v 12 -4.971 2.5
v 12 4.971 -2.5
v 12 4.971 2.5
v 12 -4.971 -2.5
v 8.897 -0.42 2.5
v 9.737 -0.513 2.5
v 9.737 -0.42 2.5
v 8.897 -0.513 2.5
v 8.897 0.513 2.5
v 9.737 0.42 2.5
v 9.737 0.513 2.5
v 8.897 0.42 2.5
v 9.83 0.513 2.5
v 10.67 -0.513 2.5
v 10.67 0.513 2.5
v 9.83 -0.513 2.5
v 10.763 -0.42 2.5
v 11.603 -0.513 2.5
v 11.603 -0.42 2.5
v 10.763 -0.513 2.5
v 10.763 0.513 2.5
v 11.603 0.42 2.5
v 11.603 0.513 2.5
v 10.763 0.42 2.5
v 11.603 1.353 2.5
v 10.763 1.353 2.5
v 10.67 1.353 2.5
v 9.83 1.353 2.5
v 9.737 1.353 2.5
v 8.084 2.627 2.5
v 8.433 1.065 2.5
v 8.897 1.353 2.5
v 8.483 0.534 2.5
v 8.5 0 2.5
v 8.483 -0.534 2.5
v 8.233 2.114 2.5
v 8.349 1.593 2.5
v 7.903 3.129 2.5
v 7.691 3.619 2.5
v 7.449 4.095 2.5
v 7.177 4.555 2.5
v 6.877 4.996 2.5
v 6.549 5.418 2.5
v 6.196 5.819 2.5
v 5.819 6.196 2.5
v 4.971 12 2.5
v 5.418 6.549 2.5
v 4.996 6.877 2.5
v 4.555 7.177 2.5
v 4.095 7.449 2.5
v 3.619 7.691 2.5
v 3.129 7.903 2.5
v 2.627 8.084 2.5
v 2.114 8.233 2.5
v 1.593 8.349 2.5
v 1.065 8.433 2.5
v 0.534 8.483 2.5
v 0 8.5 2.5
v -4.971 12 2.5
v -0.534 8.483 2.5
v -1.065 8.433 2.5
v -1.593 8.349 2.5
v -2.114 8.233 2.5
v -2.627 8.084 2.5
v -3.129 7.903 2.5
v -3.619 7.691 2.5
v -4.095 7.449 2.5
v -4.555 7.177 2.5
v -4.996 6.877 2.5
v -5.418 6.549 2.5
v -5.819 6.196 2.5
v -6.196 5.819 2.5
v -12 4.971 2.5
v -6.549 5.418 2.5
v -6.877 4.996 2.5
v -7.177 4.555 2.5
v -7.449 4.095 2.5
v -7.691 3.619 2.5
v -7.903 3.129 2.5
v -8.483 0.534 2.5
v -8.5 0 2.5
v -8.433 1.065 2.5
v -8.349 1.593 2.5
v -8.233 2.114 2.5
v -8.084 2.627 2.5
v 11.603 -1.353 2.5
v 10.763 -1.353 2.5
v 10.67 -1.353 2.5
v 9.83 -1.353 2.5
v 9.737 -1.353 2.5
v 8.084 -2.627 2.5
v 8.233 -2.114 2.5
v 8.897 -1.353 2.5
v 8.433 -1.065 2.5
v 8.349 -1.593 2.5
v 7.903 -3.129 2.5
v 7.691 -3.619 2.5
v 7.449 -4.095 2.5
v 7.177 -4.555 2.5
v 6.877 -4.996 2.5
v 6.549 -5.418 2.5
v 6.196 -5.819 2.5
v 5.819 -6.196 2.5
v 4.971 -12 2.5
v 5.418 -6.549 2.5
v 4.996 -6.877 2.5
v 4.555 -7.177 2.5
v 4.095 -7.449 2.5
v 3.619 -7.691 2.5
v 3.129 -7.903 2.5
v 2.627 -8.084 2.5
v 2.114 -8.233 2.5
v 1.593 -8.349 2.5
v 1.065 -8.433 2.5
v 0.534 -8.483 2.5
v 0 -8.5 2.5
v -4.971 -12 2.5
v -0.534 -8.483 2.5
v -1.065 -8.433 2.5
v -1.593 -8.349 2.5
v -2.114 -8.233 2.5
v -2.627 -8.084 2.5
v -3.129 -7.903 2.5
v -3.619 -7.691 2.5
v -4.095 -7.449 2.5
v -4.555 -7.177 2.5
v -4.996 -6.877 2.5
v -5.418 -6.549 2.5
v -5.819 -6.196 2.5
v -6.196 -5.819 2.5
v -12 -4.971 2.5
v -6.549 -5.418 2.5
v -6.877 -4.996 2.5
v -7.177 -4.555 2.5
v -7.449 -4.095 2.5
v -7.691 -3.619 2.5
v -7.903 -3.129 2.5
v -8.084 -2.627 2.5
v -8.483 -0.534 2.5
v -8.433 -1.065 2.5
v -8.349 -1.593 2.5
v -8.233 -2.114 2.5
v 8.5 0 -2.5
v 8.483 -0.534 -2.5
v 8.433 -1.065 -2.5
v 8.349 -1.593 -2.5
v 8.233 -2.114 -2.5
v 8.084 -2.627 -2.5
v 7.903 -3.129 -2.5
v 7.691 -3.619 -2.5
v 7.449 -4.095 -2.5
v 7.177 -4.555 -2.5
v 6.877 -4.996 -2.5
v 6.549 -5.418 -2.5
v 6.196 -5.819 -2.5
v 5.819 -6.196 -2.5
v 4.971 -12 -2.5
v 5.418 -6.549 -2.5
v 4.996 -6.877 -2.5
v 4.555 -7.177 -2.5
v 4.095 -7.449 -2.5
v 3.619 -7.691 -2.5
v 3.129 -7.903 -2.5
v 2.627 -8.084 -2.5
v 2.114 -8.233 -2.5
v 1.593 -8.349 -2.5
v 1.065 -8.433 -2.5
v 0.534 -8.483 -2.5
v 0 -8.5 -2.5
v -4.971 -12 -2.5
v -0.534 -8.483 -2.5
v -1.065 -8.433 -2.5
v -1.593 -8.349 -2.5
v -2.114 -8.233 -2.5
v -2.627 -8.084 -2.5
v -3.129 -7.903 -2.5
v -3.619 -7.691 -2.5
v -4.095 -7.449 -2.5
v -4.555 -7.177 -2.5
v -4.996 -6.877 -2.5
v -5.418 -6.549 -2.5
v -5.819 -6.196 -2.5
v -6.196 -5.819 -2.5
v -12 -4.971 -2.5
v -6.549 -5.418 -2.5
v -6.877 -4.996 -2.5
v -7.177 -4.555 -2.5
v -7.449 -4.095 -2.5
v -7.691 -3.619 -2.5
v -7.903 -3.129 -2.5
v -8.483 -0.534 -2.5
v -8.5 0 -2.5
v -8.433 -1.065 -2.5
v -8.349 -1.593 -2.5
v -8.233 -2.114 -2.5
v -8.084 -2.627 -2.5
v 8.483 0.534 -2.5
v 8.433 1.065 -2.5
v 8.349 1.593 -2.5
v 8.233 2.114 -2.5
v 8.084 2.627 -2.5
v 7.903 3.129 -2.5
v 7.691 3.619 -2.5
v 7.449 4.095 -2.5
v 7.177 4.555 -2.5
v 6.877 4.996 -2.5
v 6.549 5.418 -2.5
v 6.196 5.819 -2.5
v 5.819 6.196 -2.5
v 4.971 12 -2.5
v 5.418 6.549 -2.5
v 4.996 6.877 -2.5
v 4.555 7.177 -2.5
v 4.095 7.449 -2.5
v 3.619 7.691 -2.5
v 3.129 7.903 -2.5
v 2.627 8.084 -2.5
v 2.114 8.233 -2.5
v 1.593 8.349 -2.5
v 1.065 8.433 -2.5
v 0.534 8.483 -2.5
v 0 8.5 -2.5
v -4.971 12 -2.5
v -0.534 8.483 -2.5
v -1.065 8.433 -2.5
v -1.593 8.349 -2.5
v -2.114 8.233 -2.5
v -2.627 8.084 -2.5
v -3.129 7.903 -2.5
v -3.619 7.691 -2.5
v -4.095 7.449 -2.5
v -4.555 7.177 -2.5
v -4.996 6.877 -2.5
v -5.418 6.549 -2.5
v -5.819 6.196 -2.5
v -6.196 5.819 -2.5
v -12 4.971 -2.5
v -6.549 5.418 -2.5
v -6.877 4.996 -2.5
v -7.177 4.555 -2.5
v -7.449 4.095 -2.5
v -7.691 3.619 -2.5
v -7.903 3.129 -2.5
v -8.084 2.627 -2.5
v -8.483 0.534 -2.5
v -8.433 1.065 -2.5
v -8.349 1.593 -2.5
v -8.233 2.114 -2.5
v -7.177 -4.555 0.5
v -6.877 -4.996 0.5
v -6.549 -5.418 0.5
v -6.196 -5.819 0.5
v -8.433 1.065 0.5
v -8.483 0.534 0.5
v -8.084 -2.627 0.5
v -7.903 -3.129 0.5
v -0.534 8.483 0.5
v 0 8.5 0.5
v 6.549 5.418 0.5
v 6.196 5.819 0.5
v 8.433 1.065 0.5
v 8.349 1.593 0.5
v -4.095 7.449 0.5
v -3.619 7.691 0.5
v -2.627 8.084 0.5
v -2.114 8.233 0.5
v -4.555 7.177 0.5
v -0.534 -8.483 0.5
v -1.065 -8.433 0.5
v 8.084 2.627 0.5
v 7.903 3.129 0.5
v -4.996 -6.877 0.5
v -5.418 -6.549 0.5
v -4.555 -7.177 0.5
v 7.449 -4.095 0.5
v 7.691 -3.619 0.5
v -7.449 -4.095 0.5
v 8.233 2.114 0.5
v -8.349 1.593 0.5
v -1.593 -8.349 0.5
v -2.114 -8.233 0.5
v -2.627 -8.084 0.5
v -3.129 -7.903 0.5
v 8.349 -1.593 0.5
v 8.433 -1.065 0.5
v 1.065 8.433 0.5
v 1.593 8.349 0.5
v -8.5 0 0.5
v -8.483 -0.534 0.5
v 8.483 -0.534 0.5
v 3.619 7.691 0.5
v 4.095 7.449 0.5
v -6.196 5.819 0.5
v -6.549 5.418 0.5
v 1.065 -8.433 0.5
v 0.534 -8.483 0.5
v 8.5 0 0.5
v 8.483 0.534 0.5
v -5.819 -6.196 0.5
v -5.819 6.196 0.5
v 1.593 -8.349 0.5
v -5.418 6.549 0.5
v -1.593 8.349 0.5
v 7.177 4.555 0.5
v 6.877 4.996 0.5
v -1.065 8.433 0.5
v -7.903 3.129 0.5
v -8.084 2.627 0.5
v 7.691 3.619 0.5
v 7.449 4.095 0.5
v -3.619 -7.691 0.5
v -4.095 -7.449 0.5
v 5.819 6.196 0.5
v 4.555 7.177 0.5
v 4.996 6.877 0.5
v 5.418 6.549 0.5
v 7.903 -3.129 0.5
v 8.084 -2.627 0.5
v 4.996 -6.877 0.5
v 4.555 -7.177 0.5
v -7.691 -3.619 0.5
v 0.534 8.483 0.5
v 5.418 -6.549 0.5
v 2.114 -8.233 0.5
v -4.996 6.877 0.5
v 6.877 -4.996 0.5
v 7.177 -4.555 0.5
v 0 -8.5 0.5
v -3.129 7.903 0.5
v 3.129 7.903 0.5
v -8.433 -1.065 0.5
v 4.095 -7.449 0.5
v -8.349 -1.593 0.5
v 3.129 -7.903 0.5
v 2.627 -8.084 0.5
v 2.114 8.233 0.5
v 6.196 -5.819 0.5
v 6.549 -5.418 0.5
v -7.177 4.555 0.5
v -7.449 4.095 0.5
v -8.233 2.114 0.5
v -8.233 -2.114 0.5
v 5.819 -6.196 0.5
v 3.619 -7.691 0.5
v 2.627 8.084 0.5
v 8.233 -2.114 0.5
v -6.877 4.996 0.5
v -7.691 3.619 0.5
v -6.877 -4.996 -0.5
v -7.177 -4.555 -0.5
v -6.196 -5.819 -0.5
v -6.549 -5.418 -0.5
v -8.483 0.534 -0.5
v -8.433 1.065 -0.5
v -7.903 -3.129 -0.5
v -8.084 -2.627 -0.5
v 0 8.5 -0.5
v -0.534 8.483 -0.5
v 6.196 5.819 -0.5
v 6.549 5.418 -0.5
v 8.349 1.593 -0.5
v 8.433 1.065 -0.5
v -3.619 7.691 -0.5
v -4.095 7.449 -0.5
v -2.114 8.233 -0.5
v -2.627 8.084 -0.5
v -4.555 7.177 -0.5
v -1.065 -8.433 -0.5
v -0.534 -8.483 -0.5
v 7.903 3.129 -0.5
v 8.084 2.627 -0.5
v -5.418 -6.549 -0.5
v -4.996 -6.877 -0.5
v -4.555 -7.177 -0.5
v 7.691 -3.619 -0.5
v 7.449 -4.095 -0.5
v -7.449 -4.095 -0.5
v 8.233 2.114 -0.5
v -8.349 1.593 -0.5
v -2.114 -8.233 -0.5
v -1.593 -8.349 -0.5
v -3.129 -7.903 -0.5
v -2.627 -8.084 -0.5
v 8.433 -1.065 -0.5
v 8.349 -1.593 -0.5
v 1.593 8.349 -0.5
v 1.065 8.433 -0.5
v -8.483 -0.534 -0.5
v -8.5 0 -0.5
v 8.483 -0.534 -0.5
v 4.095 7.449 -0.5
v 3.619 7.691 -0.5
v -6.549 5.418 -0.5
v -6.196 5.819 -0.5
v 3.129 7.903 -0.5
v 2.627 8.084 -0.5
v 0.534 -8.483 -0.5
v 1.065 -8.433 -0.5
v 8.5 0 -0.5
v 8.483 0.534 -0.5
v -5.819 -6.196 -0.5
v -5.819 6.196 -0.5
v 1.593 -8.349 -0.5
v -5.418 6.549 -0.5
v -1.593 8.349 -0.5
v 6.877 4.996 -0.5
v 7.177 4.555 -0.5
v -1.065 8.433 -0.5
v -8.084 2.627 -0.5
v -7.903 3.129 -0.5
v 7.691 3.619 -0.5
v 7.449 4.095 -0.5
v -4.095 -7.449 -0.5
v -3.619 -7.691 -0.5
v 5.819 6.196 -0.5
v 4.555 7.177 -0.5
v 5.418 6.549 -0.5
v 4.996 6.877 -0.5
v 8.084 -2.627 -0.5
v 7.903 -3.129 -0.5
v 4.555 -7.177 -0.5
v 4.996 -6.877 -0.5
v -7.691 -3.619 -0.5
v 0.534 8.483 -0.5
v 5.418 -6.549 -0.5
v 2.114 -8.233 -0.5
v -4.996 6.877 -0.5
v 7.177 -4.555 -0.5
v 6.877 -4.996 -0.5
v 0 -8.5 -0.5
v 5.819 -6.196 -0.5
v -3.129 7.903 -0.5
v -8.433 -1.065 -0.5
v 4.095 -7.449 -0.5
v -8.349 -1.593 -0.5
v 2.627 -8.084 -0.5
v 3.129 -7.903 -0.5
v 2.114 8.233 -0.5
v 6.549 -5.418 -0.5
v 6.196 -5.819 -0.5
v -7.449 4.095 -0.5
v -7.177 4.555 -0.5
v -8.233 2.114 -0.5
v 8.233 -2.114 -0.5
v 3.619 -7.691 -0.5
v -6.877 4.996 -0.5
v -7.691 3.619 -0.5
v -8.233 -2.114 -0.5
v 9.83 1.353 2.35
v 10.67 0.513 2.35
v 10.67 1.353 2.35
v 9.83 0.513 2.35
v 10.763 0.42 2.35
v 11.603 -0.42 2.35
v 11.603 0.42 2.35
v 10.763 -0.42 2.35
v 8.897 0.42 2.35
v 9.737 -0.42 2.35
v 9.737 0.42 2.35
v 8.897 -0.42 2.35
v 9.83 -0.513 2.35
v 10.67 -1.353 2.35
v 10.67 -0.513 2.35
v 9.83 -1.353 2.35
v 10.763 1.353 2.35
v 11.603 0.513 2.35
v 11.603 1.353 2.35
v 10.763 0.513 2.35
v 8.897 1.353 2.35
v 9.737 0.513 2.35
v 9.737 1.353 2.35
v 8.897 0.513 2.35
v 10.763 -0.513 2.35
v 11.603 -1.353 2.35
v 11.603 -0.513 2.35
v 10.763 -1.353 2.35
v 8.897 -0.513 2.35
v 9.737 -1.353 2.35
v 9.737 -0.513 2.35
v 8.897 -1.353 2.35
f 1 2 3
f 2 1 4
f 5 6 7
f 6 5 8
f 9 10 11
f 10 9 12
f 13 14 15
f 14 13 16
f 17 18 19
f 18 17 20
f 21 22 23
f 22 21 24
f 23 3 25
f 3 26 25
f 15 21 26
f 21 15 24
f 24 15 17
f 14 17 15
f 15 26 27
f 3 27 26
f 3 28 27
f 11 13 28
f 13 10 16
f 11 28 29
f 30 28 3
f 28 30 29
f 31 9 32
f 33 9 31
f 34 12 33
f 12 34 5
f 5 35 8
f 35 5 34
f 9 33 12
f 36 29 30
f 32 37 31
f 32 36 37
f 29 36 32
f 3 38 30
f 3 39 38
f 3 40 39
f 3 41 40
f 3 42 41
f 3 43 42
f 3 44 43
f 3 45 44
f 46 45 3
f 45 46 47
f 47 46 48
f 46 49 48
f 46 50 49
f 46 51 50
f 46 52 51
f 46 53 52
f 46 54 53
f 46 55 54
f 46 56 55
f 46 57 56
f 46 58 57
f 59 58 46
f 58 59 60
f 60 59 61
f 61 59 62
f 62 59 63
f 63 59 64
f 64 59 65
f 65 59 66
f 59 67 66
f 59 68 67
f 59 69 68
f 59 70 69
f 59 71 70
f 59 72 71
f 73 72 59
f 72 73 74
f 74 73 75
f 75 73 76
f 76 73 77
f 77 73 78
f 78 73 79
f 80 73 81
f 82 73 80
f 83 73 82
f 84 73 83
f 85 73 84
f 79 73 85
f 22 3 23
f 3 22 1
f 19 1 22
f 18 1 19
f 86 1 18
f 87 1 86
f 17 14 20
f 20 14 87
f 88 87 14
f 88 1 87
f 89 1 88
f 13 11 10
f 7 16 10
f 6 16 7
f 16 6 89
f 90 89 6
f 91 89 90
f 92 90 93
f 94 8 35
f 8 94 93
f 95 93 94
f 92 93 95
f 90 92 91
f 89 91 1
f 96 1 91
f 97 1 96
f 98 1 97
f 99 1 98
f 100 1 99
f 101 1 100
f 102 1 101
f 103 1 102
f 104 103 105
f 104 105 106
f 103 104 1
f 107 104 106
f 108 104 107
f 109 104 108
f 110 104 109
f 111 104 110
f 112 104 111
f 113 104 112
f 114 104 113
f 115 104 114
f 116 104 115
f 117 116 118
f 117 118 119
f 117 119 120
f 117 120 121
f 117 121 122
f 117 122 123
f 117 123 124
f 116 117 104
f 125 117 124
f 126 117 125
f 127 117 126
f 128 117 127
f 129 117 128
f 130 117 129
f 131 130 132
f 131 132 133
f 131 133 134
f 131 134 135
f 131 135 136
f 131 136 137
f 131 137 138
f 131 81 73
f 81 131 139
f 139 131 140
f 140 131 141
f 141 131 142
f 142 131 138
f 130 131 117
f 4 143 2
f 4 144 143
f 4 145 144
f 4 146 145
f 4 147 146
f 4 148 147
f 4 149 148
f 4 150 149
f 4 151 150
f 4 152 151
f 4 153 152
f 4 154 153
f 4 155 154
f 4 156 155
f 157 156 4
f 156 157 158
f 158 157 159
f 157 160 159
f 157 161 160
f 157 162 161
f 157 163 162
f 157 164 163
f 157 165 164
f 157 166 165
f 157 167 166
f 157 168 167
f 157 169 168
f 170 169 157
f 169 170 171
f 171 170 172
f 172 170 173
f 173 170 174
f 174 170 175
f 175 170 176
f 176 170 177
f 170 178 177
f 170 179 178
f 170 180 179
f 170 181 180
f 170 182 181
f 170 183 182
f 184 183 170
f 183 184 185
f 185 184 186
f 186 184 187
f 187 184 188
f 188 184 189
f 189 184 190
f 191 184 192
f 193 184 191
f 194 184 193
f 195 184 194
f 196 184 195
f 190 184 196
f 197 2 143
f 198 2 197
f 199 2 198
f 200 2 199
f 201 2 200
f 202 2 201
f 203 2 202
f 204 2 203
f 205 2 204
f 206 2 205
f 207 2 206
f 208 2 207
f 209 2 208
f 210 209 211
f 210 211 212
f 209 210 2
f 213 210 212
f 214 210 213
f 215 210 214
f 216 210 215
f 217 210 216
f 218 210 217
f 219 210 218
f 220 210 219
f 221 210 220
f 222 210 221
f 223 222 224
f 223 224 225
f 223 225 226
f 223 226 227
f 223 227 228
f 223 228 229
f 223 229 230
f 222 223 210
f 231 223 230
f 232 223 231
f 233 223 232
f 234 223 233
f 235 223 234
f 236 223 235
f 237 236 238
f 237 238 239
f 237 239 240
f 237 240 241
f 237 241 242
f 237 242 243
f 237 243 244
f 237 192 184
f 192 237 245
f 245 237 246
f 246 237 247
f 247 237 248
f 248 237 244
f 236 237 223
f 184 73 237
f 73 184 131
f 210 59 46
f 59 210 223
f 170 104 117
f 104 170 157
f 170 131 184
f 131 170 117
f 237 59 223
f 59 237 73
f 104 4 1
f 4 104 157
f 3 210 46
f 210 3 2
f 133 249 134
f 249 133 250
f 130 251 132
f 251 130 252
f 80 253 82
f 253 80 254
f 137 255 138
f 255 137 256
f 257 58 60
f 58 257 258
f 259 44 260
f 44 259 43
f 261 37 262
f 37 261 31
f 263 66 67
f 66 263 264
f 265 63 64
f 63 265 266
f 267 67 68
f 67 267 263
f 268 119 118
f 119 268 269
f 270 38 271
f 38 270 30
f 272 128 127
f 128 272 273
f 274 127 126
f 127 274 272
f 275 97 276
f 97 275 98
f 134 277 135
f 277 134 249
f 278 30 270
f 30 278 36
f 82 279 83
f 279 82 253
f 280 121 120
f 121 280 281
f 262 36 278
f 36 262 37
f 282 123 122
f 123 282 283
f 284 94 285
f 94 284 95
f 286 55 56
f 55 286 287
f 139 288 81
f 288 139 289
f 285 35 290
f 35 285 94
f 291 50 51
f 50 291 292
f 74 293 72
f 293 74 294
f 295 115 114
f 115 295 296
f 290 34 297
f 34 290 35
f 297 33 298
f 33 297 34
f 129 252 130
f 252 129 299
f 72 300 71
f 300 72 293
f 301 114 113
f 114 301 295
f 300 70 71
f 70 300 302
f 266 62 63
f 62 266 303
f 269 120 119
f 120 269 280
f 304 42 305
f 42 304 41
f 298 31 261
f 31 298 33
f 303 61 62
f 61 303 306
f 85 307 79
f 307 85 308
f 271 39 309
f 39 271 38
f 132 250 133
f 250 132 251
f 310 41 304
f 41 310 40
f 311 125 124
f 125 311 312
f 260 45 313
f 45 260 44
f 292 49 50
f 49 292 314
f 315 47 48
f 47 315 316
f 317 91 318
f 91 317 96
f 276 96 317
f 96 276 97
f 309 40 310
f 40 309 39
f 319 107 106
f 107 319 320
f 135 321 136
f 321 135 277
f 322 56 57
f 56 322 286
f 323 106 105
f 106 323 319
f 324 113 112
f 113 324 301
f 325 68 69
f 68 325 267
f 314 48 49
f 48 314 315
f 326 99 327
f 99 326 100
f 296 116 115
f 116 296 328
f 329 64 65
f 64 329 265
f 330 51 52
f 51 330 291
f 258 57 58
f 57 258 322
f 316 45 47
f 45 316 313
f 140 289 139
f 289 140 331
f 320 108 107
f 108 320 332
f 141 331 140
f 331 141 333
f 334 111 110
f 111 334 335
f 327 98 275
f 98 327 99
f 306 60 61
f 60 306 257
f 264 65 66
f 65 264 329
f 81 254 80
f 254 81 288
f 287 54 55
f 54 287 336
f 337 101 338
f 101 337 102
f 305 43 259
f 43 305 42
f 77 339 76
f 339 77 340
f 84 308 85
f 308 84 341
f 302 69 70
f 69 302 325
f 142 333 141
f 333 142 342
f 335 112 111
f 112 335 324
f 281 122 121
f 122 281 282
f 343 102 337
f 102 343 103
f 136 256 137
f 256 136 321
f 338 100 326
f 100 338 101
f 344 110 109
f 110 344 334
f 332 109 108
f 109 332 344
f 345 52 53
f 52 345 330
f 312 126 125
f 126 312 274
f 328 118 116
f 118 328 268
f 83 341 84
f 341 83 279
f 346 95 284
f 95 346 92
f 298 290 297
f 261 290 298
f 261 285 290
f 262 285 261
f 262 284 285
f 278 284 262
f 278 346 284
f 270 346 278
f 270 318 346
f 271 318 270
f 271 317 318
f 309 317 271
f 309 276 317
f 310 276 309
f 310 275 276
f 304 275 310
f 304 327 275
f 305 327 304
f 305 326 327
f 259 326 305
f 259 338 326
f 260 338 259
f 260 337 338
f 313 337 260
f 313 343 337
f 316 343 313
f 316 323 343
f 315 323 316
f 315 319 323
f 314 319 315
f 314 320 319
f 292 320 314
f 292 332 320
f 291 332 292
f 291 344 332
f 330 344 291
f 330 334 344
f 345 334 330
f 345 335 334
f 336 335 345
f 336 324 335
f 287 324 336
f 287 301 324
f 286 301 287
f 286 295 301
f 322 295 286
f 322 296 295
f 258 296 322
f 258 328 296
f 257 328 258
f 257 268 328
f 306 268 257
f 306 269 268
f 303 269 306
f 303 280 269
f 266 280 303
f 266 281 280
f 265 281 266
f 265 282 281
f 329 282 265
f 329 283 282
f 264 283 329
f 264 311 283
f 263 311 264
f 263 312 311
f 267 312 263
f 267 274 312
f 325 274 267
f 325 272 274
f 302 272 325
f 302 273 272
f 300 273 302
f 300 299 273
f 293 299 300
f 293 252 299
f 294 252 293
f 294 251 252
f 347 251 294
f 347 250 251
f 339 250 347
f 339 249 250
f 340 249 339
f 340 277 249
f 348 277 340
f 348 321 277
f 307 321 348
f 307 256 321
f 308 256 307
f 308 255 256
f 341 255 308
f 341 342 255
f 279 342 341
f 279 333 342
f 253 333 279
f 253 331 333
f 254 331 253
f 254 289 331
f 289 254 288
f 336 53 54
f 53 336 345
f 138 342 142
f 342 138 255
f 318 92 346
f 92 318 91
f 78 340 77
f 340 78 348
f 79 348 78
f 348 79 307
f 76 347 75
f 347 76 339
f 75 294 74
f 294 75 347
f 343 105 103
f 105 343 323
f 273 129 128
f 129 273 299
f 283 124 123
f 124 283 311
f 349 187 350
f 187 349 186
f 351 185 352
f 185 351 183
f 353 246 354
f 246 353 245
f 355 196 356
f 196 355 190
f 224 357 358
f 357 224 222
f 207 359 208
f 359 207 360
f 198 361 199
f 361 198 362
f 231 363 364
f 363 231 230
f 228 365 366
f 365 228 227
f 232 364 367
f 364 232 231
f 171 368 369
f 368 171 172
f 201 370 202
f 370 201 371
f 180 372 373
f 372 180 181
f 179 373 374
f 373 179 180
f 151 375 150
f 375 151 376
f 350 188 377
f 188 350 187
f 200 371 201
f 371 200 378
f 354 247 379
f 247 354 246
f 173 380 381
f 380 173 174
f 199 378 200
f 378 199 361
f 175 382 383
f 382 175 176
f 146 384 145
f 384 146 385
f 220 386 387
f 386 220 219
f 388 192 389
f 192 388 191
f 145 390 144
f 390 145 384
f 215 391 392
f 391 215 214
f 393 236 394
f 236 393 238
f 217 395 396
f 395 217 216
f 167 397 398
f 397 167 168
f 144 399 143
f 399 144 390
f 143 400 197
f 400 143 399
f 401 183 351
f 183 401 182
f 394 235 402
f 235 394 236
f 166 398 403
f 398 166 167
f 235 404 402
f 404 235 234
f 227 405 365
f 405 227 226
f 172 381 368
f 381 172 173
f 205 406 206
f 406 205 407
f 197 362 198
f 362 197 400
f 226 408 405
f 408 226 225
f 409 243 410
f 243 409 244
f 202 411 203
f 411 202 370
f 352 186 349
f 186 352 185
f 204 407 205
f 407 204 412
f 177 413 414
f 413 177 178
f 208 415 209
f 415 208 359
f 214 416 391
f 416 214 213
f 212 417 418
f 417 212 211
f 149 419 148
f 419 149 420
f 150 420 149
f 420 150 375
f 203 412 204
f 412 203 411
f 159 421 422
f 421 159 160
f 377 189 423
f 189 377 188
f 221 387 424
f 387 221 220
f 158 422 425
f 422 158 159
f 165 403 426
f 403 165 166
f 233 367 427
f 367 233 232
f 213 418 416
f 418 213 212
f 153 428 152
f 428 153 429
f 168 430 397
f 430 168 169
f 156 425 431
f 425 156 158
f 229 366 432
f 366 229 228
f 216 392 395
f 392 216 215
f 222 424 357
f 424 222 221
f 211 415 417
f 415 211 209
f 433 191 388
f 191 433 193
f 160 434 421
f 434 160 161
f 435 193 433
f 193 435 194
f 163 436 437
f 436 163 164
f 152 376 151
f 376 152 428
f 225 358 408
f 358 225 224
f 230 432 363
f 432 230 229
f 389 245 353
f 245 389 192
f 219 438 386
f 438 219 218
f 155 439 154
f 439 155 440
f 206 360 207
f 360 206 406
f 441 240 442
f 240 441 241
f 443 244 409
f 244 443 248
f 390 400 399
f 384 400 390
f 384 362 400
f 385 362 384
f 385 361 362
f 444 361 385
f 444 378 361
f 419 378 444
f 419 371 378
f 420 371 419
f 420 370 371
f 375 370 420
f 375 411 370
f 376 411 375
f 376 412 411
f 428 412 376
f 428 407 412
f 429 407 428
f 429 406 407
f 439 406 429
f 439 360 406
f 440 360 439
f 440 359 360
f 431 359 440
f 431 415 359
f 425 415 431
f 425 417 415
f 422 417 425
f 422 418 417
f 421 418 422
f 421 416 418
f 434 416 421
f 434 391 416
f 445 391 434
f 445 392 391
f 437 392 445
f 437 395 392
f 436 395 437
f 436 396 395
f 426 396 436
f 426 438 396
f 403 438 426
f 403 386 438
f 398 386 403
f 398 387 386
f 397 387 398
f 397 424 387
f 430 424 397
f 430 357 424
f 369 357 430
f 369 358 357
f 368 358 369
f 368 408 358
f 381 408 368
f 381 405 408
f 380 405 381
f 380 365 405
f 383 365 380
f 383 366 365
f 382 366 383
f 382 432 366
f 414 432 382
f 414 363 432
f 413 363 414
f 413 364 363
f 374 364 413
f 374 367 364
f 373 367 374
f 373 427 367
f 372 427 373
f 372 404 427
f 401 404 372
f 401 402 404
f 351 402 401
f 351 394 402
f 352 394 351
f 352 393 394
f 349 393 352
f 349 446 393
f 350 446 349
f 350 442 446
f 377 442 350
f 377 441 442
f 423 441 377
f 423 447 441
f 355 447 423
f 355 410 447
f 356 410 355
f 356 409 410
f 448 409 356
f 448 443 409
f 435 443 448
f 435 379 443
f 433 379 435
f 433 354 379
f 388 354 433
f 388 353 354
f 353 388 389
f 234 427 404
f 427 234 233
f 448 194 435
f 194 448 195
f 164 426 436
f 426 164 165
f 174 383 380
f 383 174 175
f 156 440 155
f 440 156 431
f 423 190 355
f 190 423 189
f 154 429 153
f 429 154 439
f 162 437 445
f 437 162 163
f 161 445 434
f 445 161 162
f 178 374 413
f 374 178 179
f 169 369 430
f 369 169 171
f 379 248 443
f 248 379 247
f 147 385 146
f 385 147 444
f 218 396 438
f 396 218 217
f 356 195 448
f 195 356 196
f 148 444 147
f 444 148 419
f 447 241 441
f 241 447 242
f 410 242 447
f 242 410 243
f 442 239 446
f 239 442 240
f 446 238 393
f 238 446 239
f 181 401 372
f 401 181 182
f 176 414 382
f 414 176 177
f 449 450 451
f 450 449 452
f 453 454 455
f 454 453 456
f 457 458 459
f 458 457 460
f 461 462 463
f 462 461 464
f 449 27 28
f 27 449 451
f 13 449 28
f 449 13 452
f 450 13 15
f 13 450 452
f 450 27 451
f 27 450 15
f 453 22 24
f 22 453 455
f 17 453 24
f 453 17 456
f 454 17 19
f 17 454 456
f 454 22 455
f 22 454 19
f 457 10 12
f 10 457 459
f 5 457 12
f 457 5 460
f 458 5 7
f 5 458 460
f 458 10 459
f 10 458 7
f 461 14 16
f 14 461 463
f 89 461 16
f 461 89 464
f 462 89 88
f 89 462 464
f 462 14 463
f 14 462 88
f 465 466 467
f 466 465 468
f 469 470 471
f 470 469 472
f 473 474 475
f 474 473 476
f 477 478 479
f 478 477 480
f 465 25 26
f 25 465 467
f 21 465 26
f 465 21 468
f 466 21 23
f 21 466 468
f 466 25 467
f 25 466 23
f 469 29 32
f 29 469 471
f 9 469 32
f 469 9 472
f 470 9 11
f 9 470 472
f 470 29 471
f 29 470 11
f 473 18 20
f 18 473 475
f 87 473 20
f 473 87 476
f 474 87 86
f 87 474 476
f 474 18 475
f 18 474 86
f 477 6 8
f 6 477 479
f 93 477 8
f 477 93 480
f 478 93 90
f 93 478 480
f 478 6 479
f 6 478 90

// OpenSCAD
// piece
part = "octogonal"; // [rond, carre, octogonal, jeton, corner]
element = "red"; // [red:feu, yellow:air, green:terre, blue:eau, DarkSlateGray:noir, white:blanc, gray:gris]

// width
width = 24 ; // [20:1:30]

// size of the model
thickness = 5; // [3:1:10]

// tolerence
tolerence = 0.4; // [0.05:0.05:2]

// size of jeton
cavity = 17 ; // [1:1:25]

// resolution
$fn = 100;

/* [Animation] */
// rotating animation
animation_rotation = false;

/* [Hidden] */
is_animated = animation_rotation;
$vpt = is_animated?[0, 0, 0]:$vpt;
$vpr = is_animated?[60, 0, animation_rotation?(365 * $t):45]:$vpr;  // animation rotate around the object
$vpd = is_animated?200:$vpd;
// constant epsilon
EPSI = 0.1;

color(element) {
  if (part == "rond") {
    rond(width, thickness, tolerence, cavity);
  } else if (part == "carre") {
    carre(width, thickness, tolerence, cavity);
  } else if (part == "octogonal") {
    octogonal(width, thickness, tolerence, cavity);
  } else if (part == "jeton") {
    jeton(width, thickness, tolerence, cavity);
  } else if (part == "corner") {
    corner(width, thickness, tolerence, cavity);
  } else {
    assert(false, "unknown part");
  }
}

module rond(width, thickness, tolerence, cavity) {
  difference() {
    cylinder(d = width, h = thickness, center = true);
    holes(thickness);
    deplacementRond(width, thickness, tolerence, cavity);
  }
}

module deplacementRond(width, thickness, tolerence, cavity) {
  remainingSpace = (width - cavity) / 2;
  margingPercent = 0.1; // 10% of the remaining space
  size = remainingSpace - remainingSpace * margingPercent * 2;
  iconDepth = thickness * 0.05;
  translate([cavity / 2 + remainingSpace / 2, 0, thickness / 2 - iconDepth + EPSI]) {
    linear_extrude(iconDepth) {
      translate([size / 3, size / 3]) square(size / 3 * 0.9, center = true);
      translate([size / 3, -size / 3]) square(size / 3 * 0.9, center = true);
      translate([-size / 3, size / 3]) square(size / 3 * 0.9, center = true);
      translate([-size / 3, -size / 3]) square(size / 3 * 0.9, center = true);
    }
  }
}

module carre(width, thickness, tolerence, cavity) {
  difference() {
    cube([width, width, thickness], center = true);
    holes(thickness);
    deplacementCarre(width, thickness, tolerence, cavity);
  }
}

module deplacementCarre(width, thickness, tolerence, cavity) {
  remainingSpace = (width - cavity) / 2;
  margingPercent = 0.1; // 10% of the remaining space
  size = remainingSpace - remainingSpace * margingPercent * 2;
  iconDepth = thickness * 0.05;
  translate([cavity / 2 + remainingSpace / 2, 0, thickness / 2 - iconDepth + EPSI]) {
    linear_extrude(iconDepth) {
      translate([0, size / 3]) square(size / 3 * 0.9, center = true);
      translate([0, -size / 3]) square(size / 3 * 0.9, center = true);
      translate([size / 3, 0]) square(size / 3 * 0.9, center = true);
      translate([-size / 3, 0]) square(size / 3 * 0.9, center = true);
    }
  }
}

module octogonal(width, thickness, tolerence, cavity) {
  difference() {
    intersection() {
      cube([width, width, thickness], center = true);
      rotate([0, 0, 45])
        cube([width, width, thickness], center = true);
    }
    holes(thickness);
    deplacementCarre(width, thickness, tolerence, cavity);
    deplacementRond(width, thickness, tolerence, cavity);
  }
}

module jeton(width, thickness, tolerence, cavity) {
  cylinder(d = cavity - tolerence, h = thickness * 4 / 5 - tolerence, center = true);
}

module corner(width, thickness, tolerence, cavity) {
  difference() {
    cube([width, width, thickness], center = true);
    translate([EPSI, EPSI, -thickness / 2 - EPSI])
      cube([width / 2, width / 2, thickness + EPSI * 2]);
  }
}

module holes(thickness) {
  cavity_depth = 2 / 5 * thickness;
  translate([0, 0, (thickness - cavity_depth) / 2 + EPSI])
    cylinder(d = cavity, h = cavity_depth + 2 * EPSI, center = true);
  translate([0, 0, -(thickness - cavity_depth) / 2 - EPSI])
    cylinder(d = cavity, h = cavity_depth + 2 * EPSI, center = true);
}
